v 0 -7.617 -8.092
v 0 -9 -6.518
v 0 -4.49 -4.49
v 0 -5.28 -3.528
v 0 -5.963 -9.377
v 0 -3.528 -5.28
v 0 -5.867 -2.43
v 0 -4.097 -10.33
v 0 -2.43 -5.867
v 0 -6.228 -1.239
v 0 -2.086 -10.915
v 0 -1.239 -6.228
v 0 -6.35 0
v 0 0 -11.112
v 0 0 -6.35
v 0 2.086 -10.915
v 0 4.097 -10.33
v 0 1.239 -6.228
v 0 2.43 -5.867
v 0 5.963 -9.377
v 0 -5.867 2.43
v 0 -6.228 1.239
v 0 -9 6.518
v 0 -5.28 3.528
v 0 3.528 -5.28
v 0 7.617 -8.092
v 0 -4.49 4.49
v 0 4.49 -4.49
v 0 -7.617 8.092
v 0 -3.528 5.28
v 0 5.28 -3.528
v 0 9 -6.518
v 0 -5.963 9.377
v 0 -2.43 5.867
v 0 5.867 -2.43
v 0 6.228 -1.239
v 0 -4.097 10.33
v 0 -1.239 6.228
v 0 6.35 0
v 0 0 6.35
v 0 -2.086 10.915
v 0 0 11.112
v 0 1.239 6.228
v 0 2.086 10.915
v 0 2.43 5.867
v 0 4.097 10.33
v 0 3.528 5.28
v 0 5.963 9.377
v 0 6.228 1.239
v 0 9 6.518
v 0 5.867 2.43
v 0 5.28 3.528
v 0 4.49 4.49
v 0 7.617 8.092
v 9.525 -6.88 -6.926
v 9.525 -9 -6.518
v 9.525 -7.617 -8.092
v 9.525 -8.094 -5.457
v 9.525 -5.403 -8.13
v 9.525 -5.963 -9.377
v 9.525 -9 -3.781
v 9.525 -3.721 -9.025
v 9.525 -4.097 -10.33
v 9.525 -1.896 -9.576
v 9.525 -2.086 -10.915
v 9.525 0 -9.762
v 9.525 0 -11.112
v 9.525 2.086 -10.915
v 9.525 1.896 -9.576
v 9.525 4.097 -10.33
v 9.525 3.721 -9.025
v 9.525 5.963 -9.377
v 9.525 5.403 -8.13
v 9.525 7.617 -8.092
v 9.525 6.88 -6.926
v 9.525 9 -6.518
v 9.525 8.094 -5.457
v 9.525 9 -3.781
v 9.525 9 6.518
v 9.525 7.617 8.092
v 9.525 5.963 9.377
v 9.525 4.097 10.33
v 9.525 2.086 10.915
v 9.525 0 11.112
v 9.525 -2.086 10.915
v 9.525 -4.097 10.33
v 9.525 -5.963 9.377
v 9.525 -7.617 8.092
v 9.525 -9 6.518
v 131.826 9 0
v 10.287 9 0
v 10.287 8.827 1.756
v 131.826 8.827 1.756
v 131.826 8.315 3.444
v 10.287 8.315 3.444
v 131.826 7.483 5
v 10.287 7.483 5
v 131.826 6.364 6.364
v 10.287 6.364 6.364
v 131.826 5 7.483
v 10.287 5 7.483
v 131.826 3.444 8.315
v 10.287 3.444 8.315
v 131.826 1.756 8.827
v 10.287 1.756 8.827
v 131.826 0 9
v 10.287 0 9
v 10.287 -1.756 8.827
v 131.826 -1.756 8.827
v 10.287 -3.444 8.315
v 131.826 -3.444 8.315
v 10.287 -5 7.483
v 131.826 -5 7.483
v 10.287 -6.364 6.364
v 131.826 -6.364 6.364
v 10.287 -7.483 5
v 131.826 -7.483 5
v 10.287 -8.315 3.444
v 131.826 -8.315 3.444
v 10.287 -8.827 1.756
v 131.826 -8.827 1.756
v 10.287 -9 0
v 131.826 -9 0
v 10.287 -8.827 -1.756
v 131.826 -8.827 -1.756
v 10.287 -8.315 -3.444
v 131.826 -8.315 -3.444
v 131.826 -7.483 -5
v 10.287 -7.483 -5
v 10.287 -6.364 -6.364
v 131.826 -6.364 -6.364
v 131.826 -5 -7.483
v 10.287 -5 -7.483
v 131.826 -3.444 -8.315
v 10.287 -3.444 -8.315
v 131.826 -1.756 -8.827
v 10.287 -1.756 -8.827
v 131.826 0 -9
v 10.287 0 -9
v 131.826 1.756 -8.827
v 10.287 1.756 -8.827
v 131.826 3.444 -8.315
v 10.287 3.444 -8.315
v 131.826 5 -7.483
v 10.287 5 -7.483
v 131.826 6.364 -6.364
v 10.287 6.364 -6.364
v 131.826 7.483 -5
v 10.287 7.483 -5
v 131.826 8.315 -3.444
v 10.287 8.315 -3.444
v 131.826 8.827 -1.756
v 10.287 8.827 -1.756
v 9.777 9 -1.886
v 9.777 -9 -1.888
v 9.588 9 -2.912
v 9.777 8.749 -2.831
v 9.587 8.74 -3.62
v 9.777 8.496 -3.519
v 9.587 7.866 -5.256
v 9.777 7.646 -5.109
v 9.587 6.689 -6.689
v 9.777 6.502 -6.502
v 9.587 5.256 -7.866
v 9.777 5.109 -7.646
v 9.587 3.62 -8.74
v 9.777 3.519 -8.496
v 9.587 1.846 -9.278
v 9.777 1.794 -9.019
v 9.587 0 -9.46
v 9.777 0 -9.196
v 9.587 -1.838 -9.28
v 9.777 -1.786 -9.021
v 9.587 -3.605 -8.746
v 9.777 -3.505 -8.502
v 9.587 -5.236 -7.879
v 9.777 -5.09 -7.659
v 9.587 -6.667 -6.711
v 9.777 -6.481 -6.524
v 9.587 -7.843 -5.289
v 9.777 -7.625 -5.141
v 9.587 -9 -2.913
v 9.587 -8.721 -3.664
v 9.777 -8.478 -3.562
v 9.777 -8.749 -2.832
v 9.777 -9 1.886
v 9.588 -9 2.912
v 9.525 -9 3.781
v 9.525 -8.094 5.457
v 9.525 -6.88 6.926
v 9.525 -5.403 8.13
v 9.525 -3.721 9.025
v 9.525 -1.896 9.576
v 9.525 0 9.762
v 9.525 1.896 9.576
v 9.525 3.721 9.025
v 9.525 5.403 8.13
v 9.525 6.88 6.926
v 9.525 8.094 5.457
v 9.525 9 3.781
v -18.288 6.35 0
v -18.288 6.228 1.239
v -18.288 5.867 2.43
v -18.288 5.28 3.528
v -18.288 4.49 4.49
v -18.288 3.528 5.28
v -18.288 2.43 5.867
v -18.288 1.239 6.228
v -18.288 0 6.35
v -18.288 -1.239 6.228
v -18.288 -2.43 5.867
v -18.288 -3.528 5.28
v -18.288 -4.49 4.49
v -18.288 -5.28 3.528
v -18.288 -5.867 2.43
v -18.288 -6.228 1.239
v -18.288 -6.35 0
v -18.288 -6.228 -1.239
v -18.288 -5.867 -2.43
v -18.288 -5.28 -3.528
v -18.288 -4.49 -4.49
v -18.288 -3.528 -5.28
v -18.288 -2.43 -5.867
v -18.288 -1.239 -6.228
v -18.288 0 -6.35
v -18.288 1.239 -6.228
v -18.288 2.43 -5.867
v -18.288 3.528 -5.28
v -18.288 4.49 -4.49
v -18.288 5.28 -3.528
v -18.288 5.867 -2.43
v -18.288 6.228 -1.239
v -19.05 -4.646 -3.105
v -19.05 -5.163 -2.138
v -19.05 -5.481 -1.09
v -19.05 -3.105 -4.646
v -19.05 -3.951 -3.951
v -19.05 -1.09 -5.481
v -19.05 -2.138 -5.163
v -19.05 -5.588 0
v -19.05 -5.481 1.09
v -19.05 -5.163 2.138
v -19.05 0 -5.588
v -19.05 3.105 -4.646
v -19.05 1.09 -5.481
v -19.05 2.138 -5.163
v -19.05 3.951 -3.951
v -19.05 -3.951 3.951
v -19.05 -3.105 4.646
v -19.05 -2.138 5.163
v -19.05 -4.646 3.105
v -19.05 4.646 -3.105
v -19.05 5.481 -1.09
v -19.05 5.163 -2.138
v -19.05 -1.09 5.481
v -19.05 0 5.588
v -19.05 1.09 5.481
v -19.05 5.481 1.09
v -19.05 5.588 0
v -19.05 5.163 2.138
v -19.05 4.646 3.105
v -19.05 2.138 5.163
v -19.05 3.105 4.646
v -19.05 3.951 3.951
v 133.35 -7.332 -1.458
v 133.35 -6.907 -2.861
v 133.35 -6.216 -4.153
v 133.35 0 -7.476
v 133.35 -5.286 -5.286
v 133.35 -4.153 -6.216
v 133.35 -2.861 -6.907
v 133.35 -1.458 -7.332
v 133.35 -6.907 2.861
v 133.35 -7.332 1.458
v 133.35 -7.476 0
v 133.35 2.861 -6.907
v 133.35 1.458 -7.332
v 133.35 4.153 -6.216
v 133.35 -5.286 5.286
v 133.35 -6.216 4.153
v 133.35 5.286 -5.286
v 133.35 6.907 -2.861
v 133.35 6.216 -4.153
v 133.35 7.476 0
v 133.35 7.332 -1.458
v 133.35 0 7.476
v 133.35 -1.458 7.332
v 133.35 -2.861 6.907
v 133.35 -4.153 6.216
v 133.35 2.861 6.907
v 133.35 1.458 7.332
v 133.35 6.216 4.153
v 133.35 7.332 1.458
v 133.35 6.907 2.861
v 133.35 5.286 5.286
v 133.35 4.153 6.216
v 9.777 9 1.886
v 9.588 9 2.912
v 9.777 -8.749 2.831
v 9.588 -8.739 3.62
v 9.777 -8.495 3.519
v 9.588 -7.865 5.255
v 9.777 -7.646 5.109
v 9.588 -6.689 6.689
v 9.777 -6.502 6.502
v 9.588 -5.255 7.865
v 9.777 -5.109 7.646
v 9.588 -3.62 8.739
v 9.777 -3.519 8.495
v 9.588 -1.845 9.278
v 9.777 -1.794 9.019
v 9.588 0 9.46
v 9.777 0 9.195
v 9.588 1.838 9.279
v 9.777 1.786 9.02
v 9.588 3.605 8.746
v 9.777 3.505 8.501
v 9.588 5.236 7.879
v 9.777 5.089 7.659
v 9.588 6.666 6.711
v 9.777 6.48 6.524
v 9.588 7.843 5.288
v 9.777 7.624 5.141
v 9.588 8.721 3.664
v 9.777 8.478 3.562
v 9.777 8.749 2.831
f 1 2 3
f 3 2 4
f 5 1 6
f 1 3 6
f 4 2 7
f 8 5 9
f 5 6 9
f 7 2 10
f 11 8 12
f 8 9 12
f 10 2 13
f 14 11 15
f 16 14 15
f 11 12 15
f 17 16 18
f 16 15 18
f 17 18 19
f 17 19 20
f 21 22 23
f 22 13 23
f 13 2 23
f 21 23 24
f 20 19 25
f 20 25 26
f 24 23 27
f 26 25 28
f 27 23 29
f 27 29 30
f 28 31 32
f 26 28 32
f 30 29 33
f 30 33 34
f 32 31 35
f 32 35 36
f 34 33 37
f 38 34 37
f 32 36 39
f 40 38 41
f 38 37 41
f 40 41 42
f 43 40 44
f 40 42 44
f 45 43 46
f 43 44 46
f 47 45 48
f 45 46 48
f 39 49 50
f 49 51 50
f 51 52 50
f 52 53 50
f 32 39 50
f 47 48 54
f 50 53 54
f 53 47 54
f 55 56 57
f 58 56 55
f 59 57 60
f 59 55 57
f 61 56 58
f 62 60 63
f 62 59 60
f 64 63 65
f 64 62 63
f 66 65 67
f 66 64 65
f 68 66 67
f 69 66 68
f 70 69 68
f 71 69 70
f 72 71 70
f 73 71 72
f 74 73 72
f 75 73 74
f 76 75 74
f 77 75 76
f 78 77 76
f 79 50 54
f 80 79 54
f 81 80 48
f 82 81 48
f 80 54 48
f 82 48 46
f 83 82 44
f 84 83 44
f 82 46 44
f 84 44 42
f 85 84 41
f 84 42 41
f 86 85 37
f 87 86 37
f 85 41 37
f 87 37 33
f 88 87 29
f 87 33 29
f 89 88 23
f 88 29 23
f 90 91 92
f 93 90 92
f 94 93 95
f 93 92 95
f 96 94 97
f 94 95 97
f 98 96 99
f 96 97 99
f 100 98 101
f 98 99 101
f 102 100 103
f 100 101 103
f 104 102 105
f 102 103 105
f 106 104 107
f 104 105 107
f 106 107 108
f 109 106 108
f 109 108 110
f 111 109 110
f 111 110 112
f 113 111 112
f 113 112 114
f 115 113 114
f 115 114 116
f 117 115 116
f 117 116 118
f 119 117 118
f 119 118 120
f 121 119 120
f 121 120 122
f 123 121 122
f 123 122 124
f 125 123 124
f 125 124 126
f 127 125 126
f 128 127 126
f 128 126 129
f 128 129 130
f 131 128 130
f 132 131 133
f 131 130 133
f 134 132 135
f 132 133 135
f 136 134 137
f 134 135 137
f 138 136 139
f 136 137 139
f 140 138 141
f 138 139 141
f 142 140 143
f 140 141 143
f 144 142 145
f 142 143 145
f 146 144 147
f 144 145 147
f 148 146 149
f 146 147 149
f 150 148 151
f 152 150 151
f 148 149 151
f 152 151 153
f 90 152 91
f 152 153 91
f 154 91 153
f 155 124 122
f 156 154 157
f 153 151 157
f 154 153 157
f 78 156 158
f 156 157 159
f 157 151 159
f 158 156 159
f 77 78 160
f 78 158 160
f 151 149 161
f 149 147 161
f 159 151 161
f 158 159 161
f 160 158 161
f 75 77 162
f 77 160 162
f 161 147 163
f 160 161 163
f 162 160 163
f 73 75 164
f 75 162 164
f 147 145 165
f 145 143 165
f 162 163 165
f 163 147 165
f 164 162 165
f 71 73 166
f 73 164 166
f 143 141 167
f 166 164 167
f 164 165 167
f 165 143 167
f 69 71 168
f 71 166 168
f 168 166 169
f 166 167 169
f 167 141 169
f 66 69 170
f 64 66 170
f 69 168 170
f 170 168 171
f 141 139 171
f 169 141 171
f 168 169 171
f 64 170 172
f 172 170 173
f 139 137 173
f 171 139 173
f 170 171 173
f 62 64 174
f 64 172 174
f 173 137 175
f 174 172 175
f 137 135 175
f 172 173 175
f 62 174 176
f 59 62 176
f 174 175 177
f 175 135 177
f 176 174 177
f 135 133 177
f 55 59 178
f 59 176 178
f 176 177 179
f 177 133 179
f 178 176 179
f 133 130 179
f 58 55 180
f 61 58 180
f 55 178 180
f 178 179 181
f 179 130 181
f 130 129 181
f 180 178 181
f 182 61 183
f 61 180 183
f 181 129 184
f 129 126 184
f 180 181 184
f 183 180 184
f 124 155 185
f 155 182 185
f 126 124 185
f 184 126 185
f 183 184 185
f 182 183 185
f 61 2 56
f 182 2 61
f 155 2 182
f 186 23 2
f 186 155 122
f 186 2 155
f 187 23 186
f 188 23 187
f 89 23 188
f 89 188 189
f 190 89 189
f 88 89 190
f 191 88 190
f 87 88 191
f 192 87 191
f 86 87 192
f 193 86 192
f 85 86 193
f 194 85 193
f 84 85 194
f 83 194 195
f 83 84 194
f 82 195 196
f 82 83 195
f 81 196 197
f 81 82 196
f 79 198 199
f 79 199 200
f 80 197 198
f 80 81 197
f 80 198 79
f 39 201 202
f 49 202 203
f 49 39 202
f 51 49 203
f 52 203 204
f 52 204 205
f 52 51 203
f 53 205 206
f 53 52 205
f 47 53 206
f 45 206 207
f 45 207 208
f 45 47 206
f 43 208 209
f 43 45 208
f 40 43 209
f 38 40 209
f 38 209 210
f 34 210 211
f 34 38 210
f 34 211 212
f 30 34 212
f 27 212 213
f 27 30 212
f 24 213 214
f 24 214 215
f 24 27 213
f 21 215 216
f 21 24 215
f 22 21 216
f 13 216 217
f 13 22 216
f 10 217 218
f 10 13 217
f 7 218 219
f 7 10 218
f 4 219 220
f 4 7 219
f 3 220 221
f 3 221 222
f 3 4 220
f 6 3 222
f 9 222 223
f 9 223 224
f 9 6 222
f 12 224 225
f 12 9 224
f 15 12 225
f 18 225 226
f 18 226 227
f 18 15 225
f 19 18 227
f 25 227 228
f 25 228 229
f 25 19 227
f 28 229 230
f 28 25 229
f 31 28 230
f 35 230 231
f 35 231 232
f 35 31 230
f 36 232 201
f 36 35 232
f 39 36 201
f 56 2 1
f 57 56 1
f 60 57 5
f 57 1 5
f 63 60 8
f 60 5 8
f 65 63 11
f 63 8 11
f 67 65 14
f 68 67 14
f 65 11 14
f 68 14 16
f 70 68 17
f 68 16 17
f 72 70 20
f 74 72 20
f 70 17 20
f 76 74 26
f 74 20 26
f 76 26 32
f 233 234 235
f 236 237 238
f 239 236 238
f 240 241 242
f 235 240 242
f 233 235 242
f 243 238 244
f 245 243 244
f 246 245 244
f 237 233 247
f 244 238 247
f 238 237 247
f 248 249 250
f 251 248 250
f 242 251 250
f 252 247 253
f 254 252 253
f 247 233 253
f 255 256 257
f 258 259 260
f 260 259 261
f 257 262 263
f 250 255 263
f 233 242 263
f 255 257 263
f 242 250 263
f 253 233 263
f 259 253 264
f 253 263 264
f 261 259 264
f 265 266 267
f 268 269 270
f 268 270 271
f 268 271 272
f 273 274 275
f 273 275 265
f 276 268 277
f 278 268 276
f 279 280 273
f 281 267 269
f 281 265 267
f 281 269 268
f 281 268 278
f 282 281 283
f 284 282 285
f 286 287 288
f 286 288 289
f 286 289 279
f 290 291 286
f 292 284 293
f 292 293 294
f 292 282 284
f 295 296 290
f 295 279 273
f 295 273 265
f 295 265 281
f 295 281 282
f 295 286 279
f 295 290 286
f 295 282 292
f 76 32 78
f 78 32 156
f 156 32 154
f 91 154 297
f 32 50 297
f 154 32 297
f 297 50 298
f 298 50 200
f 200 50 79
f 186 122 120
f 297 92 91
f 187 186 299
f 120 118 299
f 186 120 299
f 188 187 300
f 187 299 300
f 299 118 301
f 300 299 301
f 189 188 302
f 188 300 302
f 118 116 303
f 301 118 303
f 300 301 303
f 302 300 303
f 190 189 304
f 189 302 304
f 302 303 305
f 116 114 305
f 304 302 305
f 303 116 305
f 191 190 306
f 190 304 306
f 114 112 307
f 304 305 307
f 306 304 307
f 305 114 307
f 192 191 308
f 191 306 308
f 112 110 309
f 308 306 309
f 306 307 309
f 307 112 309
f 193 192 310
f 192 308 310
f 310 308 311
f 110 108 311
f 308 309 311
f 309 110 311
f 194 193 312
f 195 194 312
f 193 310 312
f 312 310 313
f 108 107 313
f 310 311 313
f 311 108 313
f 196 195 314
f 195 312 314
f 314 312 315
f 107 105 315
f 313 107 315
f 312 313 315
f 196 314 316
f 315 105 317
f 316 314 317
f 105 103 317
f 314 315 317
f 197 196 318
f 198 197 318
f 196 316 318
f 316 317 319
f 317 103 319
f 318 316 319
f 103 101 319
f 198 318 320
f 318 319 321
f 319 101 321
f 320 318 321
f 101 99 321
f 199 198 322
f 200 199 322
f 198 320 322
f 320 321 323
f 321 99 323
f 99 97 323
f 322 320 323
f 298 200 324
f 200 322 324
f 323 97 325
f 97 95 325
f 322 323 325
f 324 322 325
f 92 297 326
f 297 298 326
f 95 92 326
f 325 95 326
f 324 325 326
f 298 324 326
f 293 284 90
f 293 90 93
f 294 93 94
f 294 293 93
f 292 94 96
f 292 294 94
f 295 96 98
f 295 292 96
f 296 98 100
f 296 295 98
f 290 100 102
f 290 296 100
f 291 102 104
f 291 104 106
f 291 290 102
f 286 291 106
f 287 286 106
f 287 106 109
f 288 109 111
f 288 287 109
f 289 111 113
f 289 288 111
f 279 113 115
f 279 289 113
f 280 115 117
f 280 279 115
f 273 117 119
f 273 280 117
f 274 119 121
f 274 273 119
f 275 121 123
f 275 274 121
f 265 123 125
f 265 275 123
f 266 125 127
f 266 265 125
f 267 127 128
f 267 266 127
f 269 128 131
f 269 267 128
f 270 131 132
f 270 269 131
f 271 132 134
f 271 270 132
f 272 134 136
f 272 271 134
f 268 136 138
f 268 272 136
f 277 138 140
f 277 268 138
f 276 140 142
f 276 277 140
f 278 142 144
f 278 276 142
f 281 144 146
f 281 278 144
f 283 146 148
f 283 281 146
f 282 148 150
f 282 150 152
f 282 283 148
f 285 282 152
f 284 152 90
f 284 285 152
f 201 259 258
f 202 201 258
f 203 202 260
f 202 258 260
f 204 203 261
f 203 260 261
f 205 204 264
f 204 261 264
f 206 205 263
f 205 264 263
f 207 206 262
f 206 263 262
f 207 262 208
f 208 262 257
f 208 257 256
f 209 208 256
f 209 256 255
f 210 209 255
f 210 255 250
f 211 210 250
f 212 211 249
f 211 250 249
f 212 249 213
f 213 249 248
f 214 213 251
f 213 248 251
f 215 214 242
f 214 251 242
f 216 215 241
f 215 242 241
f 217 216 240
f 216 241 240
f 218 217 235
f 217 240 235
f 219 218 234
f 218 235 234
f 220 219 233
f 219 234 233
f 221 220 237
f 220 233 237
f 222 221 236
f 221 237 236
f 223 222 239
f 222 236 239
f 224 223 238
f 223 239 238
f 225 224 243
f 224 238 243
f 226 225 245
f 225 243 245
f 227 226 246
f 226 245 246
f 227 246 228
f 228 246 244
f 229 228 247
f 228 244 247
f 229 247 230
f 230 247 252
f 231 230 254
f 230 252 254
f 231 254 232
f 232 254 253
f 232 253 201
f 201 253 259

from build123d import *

# Parameters (mm, degrees)
F0_R           = 6.35
F1_DEPTH       = 19.05
F2_SIZE        = 0.762
F3_R           = 9
F4_DEPTH       = 133.35
F5_R           = 11.1125
F6_DEPTH       = 9.525
F7_R           = 0.762
F8_SIZE        = 1.524
F9_W           = 13.2510633147
F9_H           = 4.6713348329
F10_DEPTH      = 11.1135
F10_DEPTH_BACK = 11.1135


with BuildPart() as f1:
    # F0 (on Right) → F1 (new body)
    with BuildSketch(Plane.YZ):
        Circle(F0_R)
    extrude(amount=-F1_DEPTH)

    # F2
    f2_edges = [f1.edges().sort_by_distance(p)[0] for p in [
        (-19.05, -6.35, 0),
    ]]
    chamfer(f2_edges, length=F2_SIZE)

    # F3 (on Right) → F4 (join)
    with BuildSketch(Plane.YZ):
        Circle(F3_R)
    extrude(amount=F4_DEPTH)

    # F5 (on Right) → F6 (join)
    with BuildSketch(Plane.YZ):
        Circle(F5_R)
    extrude(amount=F6_DEPTH)

    # F7
    f7_edges = [f1.edges().sort_by_distance(p)[0] for p in [
        (9.525, -9, 0),
    ]]
    fillet(f7_edges, radius=F7_R)

    # F8
    f8_edges = [f1.edges().sort_by_distance(p)[0] for p in [
        (133.35, -9, 0),
    ]]
    chamfer(f8_edges, length=F8_SIZE)

    # F9 (on Top) → F10 (cut, two sides)
    with BuildSketch(Plane.XY) as f10_sk:
        with Locations((3.6614683426, 11.3356674165)):
            Rectangle(F9_W, F9_H)
        with Locations((3.6614683426, -11.3356674165)):
            Rectangle(F9_W, F9_H)
    extrude(amount=-F10_DEPTH, mode=Mode.SUBTRACT)
    extrude(f10_sk.sketch, amount=F10_DEPTH_BACK, mode=Mode.SUBTRACT)


solid = f1.part
